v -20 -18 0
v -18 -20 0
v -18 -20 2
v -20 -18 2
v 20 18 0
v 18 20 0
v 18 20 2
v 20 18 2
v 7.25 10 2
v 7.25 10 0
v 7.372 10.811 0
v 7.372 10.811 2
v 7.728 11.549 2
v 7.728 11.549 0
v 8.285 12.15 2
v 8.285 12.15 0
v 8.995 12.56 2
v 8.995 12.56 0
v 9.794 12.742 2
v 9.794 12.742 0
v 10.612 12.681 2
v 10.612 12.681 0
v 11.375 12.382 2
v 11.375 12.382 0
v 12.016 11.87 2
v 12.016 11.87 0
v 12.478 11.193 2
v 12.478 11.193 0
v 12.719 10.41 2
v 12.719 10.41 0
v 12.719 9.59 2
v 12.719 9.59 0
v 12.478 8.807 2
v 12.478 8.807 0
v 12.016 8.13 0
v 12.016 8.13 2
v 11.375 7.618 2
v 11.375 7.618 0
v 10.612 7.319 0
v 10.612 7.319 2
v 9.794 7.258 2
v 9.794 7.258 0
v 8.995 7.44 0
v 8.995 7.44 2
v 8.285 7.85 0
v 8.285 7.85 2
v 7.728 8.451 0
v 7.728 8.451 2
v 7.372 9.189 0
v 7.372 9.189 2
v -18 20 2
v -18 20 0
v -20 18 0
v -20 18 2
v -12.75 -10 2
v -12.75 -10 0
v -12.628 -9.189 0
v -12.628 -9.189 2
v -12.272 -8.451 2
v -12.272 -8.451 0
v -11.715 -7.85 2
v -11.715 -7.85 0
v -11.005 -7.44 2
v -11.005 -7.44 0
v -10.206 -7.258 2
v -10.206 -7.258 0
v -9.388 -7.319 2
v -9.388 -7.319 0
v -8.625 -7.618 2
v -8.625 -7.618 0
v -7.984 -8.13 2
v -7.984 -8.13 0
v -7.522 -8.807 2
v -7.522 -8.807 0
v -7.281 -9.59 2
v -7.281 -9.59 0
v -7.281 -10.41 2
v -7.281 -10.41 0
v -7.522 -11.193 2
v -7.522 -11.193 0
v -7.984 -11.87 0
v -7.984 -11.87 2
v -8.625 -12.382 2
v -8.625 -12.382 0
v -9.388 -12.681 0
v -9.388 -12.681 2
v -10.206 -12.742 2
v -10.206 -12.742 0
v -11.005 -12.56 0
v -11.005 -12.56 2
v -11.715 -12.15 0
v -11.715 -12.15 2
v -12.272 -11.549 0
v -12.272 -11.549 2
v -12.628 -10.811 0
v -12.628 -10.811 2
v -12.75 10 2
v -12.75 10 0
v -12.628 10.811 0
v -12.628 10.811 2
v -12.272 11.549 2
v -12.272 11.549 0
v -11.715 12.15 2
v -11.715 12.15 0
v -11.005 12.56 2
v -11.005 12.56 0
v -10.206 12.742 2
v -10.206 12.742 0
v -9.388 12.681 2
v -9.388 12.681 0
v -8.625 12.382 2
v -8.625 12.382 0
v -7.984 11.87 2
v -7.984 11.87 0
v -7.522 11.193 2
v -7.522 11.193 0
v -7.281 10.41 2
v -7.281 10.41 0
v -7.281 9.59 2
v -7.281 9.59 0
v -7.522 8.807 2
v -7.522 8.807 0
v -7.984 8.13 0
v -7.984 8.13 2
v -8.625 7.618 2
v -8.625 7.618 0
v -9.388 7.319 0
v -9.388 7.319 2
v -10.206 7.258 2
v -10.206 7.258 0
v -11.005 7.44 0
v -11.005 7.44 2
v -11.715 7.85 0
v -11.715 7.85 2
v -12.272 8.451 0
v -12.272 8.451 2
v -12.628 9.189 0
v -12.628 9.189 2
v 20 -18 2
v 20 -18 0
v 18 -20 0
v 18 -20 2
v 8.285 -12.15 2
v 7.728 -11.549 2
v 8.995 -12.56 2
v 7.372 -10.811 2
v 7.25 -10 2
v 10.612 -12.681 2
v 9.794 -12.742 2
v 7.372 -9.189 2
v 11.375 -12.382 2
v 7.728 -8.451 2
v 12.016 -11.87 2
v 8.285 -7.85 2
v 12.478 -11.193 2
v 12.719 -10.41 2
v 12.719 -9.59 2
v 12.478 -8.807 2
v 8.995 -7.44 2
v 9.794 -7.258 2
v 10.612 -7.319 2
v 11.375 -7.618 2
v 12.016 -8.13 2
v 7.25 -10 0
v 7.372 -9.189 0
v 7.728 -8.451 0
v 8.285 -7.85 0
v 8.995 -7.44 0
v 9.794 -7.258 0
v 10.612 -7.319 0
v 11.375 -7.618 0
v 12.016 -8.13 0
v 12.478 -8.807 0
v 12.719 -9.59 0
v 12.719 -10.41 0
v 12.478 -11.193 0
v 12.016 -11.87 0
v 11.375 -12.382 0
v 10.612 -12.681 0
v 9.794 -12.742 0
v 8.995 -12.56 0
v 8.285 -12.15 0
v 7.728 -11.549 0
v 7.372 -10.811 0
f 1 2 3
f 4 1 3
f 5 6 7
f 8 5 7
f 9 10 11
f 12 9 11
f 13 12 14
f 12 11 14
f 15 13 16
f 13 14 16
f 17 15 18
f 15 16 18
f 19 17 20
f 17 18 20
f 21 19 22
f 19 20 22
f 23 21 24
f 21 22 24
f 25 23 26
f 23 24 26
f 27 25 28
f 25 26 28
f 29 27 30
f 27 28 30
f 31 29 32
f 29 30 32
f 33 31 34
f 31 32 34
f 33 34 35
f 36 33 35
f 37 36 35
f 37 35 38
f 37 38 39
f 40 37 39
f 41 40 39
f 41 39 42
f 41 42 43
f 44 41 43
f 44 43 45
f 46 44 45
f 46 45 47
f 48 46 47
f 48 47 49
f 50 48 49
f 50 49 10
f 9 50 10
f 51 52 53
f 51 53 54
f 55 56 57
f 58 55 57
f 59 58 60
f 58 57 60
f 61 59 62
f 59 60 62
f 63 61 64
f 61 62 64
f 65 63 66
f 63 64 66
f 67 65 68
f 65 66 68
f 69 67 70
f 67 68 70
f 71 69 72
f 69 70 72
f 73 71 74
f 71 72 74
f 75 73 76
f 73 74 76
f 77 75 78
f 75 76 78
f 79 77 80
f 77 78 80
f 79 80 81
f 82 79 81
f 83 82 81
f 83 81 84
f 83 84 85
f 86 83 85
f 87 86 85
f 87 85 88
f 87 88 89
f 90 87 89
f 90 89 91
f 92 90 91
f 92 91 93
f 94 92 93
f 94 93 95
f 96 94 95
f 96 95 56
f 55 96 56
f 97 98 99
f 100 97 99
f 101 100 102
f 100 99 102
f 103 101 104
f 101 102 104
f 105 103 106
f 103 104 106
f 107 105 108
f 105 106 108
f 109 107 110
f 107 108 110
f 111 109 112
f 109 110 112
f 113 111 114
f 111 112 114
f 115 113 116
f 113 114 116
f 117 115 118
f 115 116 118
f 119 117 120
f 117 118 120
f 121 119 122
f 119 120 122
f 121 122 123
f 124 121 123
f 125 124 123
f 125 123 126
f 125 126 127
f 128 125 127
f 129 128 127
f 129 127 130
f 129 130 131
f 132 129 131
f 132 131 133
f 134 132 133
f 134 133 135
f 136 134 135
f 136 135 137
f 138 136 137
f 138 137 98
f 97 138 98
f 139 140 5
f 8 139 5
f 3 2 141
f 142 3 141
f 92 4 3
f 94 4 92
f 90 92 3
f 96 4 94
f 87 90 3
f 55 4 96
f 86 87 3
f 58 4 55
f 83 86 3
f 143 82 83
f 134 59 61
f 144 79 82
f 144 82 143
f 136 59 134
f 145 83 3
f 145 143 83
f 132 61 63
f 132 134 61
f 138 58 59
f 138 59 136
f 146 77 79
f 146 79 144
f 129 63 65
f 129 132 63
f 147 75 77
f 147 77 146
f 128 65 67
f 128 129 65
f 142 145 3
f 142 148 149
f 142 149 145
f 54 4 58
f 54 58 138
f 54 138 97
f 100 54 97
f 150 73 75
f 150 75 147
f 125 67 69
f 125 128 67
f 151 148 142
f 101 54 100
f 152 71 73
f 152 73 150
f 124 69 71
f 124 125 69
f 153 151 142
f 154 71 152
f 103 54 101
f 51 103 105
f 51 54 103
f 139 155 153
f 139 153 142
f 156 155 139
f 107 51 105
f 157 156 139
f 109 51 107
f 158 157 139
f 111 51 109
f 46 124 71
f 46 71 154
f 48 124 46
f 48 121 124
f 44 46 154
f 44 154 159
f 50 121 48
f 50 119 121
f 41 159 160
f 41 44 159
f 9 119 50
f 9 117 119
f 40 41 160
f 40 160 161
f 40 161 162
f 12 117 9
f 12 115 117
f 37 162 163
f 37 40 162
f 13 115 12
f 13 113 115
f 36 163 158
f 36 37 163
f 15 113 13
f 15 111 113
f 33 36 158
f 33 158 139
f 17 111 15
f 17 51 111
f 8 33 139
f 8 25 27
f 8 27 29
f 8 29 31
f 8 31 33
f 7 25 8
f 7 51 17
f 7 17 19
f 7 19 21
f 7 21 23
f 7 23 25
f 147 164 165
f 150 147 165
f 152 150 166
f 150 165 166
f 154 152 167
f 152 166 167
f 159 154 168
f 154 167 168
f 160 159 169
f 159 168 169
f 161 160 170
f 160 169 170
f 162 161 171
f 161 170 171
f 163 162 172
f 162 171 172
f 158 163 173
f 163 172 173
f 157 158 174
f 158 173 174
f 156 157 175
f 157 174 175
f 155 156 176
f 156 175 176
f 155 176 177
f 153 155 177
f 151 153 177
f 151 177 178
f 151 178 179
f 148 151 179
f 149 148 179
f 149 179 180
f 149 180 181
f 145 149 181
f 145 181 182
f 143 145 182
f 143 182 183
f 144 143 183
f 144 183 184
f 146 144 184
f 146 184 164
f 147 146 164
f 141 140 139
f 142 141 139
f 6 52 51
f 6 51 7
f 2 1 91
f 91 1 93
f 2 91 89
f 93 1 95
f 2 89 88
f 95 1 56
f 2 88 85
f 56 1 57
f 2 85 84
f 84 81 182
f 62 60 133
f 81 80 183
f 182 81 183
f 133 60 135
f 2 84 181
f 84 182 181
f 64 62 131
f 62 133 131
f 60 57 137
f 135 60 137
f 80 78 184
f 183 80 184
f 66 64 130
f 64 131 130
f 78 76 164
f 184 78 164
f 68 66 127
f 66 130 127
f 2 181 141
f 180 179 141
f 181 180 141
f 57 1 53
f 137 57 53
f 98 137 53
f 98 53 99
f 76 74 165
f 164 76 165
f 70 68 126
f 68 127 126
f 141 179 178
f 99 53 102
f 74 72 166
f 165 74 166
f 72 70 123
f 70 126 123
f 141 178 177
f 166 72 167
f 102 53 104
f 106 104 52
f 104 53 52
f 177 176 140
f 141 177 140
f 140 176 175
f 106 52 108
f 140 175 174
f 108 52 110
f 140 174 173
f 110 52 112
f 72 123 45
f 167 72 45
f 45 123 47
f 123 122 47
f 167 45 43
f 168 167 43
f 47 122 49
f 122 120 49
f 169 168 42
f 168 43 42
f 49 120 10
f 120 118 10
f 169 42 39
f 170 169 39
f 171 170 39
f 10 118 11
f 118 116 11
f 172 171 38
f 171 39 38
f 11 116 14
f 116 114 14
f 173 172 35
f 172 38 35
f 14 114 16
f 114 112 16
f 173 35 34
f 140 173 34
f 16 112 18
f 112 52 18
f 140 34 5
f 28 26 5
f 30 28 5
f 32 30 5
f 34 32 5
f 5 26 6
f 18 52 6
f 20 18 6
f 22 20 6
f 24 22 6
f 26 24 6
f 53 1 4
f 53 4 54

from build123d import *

# Parameters (mm, degrees)
SKETCH_1_W        = 40
SKETCH_1_H        = 40
EXTRUDE_1_DEPTH   = 2
CHAMFER_1_SIZE    = 2
HOLE_WIZARD_M51_D = 5.5


with BuildPart() as part:
    # Эскиз1 → Бобышка-Вытянуть1 (new body)
    with BuildSketch(Plane.XY):
        Rectangle(SKETCH_1_W, SKETCH_1_H)
    extrude(amount=EXTRUDE_1_DEPTH)

    # Фаска1
    chamfer_1_edges = [part.edges().sort_by_distance(p)[0] for p in [
        (20, -20, 1),
        (-20, -20, 1),
        (-20, 20, 1),
        (20, 20, 1),
    ]]
    chamfer(chamfer_1_edges, length=CHAMFER_1_SIZE)

    # Отверстие с зазором M51 (through all)
    with Locations(Plane.XY.offset(2)):
        with Locations((-10, 10), (10, 10), (-10, -10), (10, -10), (-10, 30), (10, 30), (10, -30), (-10, -30)):
            Hole(HOLE_WIZARD_M51_D / 2)


solid = part.part
